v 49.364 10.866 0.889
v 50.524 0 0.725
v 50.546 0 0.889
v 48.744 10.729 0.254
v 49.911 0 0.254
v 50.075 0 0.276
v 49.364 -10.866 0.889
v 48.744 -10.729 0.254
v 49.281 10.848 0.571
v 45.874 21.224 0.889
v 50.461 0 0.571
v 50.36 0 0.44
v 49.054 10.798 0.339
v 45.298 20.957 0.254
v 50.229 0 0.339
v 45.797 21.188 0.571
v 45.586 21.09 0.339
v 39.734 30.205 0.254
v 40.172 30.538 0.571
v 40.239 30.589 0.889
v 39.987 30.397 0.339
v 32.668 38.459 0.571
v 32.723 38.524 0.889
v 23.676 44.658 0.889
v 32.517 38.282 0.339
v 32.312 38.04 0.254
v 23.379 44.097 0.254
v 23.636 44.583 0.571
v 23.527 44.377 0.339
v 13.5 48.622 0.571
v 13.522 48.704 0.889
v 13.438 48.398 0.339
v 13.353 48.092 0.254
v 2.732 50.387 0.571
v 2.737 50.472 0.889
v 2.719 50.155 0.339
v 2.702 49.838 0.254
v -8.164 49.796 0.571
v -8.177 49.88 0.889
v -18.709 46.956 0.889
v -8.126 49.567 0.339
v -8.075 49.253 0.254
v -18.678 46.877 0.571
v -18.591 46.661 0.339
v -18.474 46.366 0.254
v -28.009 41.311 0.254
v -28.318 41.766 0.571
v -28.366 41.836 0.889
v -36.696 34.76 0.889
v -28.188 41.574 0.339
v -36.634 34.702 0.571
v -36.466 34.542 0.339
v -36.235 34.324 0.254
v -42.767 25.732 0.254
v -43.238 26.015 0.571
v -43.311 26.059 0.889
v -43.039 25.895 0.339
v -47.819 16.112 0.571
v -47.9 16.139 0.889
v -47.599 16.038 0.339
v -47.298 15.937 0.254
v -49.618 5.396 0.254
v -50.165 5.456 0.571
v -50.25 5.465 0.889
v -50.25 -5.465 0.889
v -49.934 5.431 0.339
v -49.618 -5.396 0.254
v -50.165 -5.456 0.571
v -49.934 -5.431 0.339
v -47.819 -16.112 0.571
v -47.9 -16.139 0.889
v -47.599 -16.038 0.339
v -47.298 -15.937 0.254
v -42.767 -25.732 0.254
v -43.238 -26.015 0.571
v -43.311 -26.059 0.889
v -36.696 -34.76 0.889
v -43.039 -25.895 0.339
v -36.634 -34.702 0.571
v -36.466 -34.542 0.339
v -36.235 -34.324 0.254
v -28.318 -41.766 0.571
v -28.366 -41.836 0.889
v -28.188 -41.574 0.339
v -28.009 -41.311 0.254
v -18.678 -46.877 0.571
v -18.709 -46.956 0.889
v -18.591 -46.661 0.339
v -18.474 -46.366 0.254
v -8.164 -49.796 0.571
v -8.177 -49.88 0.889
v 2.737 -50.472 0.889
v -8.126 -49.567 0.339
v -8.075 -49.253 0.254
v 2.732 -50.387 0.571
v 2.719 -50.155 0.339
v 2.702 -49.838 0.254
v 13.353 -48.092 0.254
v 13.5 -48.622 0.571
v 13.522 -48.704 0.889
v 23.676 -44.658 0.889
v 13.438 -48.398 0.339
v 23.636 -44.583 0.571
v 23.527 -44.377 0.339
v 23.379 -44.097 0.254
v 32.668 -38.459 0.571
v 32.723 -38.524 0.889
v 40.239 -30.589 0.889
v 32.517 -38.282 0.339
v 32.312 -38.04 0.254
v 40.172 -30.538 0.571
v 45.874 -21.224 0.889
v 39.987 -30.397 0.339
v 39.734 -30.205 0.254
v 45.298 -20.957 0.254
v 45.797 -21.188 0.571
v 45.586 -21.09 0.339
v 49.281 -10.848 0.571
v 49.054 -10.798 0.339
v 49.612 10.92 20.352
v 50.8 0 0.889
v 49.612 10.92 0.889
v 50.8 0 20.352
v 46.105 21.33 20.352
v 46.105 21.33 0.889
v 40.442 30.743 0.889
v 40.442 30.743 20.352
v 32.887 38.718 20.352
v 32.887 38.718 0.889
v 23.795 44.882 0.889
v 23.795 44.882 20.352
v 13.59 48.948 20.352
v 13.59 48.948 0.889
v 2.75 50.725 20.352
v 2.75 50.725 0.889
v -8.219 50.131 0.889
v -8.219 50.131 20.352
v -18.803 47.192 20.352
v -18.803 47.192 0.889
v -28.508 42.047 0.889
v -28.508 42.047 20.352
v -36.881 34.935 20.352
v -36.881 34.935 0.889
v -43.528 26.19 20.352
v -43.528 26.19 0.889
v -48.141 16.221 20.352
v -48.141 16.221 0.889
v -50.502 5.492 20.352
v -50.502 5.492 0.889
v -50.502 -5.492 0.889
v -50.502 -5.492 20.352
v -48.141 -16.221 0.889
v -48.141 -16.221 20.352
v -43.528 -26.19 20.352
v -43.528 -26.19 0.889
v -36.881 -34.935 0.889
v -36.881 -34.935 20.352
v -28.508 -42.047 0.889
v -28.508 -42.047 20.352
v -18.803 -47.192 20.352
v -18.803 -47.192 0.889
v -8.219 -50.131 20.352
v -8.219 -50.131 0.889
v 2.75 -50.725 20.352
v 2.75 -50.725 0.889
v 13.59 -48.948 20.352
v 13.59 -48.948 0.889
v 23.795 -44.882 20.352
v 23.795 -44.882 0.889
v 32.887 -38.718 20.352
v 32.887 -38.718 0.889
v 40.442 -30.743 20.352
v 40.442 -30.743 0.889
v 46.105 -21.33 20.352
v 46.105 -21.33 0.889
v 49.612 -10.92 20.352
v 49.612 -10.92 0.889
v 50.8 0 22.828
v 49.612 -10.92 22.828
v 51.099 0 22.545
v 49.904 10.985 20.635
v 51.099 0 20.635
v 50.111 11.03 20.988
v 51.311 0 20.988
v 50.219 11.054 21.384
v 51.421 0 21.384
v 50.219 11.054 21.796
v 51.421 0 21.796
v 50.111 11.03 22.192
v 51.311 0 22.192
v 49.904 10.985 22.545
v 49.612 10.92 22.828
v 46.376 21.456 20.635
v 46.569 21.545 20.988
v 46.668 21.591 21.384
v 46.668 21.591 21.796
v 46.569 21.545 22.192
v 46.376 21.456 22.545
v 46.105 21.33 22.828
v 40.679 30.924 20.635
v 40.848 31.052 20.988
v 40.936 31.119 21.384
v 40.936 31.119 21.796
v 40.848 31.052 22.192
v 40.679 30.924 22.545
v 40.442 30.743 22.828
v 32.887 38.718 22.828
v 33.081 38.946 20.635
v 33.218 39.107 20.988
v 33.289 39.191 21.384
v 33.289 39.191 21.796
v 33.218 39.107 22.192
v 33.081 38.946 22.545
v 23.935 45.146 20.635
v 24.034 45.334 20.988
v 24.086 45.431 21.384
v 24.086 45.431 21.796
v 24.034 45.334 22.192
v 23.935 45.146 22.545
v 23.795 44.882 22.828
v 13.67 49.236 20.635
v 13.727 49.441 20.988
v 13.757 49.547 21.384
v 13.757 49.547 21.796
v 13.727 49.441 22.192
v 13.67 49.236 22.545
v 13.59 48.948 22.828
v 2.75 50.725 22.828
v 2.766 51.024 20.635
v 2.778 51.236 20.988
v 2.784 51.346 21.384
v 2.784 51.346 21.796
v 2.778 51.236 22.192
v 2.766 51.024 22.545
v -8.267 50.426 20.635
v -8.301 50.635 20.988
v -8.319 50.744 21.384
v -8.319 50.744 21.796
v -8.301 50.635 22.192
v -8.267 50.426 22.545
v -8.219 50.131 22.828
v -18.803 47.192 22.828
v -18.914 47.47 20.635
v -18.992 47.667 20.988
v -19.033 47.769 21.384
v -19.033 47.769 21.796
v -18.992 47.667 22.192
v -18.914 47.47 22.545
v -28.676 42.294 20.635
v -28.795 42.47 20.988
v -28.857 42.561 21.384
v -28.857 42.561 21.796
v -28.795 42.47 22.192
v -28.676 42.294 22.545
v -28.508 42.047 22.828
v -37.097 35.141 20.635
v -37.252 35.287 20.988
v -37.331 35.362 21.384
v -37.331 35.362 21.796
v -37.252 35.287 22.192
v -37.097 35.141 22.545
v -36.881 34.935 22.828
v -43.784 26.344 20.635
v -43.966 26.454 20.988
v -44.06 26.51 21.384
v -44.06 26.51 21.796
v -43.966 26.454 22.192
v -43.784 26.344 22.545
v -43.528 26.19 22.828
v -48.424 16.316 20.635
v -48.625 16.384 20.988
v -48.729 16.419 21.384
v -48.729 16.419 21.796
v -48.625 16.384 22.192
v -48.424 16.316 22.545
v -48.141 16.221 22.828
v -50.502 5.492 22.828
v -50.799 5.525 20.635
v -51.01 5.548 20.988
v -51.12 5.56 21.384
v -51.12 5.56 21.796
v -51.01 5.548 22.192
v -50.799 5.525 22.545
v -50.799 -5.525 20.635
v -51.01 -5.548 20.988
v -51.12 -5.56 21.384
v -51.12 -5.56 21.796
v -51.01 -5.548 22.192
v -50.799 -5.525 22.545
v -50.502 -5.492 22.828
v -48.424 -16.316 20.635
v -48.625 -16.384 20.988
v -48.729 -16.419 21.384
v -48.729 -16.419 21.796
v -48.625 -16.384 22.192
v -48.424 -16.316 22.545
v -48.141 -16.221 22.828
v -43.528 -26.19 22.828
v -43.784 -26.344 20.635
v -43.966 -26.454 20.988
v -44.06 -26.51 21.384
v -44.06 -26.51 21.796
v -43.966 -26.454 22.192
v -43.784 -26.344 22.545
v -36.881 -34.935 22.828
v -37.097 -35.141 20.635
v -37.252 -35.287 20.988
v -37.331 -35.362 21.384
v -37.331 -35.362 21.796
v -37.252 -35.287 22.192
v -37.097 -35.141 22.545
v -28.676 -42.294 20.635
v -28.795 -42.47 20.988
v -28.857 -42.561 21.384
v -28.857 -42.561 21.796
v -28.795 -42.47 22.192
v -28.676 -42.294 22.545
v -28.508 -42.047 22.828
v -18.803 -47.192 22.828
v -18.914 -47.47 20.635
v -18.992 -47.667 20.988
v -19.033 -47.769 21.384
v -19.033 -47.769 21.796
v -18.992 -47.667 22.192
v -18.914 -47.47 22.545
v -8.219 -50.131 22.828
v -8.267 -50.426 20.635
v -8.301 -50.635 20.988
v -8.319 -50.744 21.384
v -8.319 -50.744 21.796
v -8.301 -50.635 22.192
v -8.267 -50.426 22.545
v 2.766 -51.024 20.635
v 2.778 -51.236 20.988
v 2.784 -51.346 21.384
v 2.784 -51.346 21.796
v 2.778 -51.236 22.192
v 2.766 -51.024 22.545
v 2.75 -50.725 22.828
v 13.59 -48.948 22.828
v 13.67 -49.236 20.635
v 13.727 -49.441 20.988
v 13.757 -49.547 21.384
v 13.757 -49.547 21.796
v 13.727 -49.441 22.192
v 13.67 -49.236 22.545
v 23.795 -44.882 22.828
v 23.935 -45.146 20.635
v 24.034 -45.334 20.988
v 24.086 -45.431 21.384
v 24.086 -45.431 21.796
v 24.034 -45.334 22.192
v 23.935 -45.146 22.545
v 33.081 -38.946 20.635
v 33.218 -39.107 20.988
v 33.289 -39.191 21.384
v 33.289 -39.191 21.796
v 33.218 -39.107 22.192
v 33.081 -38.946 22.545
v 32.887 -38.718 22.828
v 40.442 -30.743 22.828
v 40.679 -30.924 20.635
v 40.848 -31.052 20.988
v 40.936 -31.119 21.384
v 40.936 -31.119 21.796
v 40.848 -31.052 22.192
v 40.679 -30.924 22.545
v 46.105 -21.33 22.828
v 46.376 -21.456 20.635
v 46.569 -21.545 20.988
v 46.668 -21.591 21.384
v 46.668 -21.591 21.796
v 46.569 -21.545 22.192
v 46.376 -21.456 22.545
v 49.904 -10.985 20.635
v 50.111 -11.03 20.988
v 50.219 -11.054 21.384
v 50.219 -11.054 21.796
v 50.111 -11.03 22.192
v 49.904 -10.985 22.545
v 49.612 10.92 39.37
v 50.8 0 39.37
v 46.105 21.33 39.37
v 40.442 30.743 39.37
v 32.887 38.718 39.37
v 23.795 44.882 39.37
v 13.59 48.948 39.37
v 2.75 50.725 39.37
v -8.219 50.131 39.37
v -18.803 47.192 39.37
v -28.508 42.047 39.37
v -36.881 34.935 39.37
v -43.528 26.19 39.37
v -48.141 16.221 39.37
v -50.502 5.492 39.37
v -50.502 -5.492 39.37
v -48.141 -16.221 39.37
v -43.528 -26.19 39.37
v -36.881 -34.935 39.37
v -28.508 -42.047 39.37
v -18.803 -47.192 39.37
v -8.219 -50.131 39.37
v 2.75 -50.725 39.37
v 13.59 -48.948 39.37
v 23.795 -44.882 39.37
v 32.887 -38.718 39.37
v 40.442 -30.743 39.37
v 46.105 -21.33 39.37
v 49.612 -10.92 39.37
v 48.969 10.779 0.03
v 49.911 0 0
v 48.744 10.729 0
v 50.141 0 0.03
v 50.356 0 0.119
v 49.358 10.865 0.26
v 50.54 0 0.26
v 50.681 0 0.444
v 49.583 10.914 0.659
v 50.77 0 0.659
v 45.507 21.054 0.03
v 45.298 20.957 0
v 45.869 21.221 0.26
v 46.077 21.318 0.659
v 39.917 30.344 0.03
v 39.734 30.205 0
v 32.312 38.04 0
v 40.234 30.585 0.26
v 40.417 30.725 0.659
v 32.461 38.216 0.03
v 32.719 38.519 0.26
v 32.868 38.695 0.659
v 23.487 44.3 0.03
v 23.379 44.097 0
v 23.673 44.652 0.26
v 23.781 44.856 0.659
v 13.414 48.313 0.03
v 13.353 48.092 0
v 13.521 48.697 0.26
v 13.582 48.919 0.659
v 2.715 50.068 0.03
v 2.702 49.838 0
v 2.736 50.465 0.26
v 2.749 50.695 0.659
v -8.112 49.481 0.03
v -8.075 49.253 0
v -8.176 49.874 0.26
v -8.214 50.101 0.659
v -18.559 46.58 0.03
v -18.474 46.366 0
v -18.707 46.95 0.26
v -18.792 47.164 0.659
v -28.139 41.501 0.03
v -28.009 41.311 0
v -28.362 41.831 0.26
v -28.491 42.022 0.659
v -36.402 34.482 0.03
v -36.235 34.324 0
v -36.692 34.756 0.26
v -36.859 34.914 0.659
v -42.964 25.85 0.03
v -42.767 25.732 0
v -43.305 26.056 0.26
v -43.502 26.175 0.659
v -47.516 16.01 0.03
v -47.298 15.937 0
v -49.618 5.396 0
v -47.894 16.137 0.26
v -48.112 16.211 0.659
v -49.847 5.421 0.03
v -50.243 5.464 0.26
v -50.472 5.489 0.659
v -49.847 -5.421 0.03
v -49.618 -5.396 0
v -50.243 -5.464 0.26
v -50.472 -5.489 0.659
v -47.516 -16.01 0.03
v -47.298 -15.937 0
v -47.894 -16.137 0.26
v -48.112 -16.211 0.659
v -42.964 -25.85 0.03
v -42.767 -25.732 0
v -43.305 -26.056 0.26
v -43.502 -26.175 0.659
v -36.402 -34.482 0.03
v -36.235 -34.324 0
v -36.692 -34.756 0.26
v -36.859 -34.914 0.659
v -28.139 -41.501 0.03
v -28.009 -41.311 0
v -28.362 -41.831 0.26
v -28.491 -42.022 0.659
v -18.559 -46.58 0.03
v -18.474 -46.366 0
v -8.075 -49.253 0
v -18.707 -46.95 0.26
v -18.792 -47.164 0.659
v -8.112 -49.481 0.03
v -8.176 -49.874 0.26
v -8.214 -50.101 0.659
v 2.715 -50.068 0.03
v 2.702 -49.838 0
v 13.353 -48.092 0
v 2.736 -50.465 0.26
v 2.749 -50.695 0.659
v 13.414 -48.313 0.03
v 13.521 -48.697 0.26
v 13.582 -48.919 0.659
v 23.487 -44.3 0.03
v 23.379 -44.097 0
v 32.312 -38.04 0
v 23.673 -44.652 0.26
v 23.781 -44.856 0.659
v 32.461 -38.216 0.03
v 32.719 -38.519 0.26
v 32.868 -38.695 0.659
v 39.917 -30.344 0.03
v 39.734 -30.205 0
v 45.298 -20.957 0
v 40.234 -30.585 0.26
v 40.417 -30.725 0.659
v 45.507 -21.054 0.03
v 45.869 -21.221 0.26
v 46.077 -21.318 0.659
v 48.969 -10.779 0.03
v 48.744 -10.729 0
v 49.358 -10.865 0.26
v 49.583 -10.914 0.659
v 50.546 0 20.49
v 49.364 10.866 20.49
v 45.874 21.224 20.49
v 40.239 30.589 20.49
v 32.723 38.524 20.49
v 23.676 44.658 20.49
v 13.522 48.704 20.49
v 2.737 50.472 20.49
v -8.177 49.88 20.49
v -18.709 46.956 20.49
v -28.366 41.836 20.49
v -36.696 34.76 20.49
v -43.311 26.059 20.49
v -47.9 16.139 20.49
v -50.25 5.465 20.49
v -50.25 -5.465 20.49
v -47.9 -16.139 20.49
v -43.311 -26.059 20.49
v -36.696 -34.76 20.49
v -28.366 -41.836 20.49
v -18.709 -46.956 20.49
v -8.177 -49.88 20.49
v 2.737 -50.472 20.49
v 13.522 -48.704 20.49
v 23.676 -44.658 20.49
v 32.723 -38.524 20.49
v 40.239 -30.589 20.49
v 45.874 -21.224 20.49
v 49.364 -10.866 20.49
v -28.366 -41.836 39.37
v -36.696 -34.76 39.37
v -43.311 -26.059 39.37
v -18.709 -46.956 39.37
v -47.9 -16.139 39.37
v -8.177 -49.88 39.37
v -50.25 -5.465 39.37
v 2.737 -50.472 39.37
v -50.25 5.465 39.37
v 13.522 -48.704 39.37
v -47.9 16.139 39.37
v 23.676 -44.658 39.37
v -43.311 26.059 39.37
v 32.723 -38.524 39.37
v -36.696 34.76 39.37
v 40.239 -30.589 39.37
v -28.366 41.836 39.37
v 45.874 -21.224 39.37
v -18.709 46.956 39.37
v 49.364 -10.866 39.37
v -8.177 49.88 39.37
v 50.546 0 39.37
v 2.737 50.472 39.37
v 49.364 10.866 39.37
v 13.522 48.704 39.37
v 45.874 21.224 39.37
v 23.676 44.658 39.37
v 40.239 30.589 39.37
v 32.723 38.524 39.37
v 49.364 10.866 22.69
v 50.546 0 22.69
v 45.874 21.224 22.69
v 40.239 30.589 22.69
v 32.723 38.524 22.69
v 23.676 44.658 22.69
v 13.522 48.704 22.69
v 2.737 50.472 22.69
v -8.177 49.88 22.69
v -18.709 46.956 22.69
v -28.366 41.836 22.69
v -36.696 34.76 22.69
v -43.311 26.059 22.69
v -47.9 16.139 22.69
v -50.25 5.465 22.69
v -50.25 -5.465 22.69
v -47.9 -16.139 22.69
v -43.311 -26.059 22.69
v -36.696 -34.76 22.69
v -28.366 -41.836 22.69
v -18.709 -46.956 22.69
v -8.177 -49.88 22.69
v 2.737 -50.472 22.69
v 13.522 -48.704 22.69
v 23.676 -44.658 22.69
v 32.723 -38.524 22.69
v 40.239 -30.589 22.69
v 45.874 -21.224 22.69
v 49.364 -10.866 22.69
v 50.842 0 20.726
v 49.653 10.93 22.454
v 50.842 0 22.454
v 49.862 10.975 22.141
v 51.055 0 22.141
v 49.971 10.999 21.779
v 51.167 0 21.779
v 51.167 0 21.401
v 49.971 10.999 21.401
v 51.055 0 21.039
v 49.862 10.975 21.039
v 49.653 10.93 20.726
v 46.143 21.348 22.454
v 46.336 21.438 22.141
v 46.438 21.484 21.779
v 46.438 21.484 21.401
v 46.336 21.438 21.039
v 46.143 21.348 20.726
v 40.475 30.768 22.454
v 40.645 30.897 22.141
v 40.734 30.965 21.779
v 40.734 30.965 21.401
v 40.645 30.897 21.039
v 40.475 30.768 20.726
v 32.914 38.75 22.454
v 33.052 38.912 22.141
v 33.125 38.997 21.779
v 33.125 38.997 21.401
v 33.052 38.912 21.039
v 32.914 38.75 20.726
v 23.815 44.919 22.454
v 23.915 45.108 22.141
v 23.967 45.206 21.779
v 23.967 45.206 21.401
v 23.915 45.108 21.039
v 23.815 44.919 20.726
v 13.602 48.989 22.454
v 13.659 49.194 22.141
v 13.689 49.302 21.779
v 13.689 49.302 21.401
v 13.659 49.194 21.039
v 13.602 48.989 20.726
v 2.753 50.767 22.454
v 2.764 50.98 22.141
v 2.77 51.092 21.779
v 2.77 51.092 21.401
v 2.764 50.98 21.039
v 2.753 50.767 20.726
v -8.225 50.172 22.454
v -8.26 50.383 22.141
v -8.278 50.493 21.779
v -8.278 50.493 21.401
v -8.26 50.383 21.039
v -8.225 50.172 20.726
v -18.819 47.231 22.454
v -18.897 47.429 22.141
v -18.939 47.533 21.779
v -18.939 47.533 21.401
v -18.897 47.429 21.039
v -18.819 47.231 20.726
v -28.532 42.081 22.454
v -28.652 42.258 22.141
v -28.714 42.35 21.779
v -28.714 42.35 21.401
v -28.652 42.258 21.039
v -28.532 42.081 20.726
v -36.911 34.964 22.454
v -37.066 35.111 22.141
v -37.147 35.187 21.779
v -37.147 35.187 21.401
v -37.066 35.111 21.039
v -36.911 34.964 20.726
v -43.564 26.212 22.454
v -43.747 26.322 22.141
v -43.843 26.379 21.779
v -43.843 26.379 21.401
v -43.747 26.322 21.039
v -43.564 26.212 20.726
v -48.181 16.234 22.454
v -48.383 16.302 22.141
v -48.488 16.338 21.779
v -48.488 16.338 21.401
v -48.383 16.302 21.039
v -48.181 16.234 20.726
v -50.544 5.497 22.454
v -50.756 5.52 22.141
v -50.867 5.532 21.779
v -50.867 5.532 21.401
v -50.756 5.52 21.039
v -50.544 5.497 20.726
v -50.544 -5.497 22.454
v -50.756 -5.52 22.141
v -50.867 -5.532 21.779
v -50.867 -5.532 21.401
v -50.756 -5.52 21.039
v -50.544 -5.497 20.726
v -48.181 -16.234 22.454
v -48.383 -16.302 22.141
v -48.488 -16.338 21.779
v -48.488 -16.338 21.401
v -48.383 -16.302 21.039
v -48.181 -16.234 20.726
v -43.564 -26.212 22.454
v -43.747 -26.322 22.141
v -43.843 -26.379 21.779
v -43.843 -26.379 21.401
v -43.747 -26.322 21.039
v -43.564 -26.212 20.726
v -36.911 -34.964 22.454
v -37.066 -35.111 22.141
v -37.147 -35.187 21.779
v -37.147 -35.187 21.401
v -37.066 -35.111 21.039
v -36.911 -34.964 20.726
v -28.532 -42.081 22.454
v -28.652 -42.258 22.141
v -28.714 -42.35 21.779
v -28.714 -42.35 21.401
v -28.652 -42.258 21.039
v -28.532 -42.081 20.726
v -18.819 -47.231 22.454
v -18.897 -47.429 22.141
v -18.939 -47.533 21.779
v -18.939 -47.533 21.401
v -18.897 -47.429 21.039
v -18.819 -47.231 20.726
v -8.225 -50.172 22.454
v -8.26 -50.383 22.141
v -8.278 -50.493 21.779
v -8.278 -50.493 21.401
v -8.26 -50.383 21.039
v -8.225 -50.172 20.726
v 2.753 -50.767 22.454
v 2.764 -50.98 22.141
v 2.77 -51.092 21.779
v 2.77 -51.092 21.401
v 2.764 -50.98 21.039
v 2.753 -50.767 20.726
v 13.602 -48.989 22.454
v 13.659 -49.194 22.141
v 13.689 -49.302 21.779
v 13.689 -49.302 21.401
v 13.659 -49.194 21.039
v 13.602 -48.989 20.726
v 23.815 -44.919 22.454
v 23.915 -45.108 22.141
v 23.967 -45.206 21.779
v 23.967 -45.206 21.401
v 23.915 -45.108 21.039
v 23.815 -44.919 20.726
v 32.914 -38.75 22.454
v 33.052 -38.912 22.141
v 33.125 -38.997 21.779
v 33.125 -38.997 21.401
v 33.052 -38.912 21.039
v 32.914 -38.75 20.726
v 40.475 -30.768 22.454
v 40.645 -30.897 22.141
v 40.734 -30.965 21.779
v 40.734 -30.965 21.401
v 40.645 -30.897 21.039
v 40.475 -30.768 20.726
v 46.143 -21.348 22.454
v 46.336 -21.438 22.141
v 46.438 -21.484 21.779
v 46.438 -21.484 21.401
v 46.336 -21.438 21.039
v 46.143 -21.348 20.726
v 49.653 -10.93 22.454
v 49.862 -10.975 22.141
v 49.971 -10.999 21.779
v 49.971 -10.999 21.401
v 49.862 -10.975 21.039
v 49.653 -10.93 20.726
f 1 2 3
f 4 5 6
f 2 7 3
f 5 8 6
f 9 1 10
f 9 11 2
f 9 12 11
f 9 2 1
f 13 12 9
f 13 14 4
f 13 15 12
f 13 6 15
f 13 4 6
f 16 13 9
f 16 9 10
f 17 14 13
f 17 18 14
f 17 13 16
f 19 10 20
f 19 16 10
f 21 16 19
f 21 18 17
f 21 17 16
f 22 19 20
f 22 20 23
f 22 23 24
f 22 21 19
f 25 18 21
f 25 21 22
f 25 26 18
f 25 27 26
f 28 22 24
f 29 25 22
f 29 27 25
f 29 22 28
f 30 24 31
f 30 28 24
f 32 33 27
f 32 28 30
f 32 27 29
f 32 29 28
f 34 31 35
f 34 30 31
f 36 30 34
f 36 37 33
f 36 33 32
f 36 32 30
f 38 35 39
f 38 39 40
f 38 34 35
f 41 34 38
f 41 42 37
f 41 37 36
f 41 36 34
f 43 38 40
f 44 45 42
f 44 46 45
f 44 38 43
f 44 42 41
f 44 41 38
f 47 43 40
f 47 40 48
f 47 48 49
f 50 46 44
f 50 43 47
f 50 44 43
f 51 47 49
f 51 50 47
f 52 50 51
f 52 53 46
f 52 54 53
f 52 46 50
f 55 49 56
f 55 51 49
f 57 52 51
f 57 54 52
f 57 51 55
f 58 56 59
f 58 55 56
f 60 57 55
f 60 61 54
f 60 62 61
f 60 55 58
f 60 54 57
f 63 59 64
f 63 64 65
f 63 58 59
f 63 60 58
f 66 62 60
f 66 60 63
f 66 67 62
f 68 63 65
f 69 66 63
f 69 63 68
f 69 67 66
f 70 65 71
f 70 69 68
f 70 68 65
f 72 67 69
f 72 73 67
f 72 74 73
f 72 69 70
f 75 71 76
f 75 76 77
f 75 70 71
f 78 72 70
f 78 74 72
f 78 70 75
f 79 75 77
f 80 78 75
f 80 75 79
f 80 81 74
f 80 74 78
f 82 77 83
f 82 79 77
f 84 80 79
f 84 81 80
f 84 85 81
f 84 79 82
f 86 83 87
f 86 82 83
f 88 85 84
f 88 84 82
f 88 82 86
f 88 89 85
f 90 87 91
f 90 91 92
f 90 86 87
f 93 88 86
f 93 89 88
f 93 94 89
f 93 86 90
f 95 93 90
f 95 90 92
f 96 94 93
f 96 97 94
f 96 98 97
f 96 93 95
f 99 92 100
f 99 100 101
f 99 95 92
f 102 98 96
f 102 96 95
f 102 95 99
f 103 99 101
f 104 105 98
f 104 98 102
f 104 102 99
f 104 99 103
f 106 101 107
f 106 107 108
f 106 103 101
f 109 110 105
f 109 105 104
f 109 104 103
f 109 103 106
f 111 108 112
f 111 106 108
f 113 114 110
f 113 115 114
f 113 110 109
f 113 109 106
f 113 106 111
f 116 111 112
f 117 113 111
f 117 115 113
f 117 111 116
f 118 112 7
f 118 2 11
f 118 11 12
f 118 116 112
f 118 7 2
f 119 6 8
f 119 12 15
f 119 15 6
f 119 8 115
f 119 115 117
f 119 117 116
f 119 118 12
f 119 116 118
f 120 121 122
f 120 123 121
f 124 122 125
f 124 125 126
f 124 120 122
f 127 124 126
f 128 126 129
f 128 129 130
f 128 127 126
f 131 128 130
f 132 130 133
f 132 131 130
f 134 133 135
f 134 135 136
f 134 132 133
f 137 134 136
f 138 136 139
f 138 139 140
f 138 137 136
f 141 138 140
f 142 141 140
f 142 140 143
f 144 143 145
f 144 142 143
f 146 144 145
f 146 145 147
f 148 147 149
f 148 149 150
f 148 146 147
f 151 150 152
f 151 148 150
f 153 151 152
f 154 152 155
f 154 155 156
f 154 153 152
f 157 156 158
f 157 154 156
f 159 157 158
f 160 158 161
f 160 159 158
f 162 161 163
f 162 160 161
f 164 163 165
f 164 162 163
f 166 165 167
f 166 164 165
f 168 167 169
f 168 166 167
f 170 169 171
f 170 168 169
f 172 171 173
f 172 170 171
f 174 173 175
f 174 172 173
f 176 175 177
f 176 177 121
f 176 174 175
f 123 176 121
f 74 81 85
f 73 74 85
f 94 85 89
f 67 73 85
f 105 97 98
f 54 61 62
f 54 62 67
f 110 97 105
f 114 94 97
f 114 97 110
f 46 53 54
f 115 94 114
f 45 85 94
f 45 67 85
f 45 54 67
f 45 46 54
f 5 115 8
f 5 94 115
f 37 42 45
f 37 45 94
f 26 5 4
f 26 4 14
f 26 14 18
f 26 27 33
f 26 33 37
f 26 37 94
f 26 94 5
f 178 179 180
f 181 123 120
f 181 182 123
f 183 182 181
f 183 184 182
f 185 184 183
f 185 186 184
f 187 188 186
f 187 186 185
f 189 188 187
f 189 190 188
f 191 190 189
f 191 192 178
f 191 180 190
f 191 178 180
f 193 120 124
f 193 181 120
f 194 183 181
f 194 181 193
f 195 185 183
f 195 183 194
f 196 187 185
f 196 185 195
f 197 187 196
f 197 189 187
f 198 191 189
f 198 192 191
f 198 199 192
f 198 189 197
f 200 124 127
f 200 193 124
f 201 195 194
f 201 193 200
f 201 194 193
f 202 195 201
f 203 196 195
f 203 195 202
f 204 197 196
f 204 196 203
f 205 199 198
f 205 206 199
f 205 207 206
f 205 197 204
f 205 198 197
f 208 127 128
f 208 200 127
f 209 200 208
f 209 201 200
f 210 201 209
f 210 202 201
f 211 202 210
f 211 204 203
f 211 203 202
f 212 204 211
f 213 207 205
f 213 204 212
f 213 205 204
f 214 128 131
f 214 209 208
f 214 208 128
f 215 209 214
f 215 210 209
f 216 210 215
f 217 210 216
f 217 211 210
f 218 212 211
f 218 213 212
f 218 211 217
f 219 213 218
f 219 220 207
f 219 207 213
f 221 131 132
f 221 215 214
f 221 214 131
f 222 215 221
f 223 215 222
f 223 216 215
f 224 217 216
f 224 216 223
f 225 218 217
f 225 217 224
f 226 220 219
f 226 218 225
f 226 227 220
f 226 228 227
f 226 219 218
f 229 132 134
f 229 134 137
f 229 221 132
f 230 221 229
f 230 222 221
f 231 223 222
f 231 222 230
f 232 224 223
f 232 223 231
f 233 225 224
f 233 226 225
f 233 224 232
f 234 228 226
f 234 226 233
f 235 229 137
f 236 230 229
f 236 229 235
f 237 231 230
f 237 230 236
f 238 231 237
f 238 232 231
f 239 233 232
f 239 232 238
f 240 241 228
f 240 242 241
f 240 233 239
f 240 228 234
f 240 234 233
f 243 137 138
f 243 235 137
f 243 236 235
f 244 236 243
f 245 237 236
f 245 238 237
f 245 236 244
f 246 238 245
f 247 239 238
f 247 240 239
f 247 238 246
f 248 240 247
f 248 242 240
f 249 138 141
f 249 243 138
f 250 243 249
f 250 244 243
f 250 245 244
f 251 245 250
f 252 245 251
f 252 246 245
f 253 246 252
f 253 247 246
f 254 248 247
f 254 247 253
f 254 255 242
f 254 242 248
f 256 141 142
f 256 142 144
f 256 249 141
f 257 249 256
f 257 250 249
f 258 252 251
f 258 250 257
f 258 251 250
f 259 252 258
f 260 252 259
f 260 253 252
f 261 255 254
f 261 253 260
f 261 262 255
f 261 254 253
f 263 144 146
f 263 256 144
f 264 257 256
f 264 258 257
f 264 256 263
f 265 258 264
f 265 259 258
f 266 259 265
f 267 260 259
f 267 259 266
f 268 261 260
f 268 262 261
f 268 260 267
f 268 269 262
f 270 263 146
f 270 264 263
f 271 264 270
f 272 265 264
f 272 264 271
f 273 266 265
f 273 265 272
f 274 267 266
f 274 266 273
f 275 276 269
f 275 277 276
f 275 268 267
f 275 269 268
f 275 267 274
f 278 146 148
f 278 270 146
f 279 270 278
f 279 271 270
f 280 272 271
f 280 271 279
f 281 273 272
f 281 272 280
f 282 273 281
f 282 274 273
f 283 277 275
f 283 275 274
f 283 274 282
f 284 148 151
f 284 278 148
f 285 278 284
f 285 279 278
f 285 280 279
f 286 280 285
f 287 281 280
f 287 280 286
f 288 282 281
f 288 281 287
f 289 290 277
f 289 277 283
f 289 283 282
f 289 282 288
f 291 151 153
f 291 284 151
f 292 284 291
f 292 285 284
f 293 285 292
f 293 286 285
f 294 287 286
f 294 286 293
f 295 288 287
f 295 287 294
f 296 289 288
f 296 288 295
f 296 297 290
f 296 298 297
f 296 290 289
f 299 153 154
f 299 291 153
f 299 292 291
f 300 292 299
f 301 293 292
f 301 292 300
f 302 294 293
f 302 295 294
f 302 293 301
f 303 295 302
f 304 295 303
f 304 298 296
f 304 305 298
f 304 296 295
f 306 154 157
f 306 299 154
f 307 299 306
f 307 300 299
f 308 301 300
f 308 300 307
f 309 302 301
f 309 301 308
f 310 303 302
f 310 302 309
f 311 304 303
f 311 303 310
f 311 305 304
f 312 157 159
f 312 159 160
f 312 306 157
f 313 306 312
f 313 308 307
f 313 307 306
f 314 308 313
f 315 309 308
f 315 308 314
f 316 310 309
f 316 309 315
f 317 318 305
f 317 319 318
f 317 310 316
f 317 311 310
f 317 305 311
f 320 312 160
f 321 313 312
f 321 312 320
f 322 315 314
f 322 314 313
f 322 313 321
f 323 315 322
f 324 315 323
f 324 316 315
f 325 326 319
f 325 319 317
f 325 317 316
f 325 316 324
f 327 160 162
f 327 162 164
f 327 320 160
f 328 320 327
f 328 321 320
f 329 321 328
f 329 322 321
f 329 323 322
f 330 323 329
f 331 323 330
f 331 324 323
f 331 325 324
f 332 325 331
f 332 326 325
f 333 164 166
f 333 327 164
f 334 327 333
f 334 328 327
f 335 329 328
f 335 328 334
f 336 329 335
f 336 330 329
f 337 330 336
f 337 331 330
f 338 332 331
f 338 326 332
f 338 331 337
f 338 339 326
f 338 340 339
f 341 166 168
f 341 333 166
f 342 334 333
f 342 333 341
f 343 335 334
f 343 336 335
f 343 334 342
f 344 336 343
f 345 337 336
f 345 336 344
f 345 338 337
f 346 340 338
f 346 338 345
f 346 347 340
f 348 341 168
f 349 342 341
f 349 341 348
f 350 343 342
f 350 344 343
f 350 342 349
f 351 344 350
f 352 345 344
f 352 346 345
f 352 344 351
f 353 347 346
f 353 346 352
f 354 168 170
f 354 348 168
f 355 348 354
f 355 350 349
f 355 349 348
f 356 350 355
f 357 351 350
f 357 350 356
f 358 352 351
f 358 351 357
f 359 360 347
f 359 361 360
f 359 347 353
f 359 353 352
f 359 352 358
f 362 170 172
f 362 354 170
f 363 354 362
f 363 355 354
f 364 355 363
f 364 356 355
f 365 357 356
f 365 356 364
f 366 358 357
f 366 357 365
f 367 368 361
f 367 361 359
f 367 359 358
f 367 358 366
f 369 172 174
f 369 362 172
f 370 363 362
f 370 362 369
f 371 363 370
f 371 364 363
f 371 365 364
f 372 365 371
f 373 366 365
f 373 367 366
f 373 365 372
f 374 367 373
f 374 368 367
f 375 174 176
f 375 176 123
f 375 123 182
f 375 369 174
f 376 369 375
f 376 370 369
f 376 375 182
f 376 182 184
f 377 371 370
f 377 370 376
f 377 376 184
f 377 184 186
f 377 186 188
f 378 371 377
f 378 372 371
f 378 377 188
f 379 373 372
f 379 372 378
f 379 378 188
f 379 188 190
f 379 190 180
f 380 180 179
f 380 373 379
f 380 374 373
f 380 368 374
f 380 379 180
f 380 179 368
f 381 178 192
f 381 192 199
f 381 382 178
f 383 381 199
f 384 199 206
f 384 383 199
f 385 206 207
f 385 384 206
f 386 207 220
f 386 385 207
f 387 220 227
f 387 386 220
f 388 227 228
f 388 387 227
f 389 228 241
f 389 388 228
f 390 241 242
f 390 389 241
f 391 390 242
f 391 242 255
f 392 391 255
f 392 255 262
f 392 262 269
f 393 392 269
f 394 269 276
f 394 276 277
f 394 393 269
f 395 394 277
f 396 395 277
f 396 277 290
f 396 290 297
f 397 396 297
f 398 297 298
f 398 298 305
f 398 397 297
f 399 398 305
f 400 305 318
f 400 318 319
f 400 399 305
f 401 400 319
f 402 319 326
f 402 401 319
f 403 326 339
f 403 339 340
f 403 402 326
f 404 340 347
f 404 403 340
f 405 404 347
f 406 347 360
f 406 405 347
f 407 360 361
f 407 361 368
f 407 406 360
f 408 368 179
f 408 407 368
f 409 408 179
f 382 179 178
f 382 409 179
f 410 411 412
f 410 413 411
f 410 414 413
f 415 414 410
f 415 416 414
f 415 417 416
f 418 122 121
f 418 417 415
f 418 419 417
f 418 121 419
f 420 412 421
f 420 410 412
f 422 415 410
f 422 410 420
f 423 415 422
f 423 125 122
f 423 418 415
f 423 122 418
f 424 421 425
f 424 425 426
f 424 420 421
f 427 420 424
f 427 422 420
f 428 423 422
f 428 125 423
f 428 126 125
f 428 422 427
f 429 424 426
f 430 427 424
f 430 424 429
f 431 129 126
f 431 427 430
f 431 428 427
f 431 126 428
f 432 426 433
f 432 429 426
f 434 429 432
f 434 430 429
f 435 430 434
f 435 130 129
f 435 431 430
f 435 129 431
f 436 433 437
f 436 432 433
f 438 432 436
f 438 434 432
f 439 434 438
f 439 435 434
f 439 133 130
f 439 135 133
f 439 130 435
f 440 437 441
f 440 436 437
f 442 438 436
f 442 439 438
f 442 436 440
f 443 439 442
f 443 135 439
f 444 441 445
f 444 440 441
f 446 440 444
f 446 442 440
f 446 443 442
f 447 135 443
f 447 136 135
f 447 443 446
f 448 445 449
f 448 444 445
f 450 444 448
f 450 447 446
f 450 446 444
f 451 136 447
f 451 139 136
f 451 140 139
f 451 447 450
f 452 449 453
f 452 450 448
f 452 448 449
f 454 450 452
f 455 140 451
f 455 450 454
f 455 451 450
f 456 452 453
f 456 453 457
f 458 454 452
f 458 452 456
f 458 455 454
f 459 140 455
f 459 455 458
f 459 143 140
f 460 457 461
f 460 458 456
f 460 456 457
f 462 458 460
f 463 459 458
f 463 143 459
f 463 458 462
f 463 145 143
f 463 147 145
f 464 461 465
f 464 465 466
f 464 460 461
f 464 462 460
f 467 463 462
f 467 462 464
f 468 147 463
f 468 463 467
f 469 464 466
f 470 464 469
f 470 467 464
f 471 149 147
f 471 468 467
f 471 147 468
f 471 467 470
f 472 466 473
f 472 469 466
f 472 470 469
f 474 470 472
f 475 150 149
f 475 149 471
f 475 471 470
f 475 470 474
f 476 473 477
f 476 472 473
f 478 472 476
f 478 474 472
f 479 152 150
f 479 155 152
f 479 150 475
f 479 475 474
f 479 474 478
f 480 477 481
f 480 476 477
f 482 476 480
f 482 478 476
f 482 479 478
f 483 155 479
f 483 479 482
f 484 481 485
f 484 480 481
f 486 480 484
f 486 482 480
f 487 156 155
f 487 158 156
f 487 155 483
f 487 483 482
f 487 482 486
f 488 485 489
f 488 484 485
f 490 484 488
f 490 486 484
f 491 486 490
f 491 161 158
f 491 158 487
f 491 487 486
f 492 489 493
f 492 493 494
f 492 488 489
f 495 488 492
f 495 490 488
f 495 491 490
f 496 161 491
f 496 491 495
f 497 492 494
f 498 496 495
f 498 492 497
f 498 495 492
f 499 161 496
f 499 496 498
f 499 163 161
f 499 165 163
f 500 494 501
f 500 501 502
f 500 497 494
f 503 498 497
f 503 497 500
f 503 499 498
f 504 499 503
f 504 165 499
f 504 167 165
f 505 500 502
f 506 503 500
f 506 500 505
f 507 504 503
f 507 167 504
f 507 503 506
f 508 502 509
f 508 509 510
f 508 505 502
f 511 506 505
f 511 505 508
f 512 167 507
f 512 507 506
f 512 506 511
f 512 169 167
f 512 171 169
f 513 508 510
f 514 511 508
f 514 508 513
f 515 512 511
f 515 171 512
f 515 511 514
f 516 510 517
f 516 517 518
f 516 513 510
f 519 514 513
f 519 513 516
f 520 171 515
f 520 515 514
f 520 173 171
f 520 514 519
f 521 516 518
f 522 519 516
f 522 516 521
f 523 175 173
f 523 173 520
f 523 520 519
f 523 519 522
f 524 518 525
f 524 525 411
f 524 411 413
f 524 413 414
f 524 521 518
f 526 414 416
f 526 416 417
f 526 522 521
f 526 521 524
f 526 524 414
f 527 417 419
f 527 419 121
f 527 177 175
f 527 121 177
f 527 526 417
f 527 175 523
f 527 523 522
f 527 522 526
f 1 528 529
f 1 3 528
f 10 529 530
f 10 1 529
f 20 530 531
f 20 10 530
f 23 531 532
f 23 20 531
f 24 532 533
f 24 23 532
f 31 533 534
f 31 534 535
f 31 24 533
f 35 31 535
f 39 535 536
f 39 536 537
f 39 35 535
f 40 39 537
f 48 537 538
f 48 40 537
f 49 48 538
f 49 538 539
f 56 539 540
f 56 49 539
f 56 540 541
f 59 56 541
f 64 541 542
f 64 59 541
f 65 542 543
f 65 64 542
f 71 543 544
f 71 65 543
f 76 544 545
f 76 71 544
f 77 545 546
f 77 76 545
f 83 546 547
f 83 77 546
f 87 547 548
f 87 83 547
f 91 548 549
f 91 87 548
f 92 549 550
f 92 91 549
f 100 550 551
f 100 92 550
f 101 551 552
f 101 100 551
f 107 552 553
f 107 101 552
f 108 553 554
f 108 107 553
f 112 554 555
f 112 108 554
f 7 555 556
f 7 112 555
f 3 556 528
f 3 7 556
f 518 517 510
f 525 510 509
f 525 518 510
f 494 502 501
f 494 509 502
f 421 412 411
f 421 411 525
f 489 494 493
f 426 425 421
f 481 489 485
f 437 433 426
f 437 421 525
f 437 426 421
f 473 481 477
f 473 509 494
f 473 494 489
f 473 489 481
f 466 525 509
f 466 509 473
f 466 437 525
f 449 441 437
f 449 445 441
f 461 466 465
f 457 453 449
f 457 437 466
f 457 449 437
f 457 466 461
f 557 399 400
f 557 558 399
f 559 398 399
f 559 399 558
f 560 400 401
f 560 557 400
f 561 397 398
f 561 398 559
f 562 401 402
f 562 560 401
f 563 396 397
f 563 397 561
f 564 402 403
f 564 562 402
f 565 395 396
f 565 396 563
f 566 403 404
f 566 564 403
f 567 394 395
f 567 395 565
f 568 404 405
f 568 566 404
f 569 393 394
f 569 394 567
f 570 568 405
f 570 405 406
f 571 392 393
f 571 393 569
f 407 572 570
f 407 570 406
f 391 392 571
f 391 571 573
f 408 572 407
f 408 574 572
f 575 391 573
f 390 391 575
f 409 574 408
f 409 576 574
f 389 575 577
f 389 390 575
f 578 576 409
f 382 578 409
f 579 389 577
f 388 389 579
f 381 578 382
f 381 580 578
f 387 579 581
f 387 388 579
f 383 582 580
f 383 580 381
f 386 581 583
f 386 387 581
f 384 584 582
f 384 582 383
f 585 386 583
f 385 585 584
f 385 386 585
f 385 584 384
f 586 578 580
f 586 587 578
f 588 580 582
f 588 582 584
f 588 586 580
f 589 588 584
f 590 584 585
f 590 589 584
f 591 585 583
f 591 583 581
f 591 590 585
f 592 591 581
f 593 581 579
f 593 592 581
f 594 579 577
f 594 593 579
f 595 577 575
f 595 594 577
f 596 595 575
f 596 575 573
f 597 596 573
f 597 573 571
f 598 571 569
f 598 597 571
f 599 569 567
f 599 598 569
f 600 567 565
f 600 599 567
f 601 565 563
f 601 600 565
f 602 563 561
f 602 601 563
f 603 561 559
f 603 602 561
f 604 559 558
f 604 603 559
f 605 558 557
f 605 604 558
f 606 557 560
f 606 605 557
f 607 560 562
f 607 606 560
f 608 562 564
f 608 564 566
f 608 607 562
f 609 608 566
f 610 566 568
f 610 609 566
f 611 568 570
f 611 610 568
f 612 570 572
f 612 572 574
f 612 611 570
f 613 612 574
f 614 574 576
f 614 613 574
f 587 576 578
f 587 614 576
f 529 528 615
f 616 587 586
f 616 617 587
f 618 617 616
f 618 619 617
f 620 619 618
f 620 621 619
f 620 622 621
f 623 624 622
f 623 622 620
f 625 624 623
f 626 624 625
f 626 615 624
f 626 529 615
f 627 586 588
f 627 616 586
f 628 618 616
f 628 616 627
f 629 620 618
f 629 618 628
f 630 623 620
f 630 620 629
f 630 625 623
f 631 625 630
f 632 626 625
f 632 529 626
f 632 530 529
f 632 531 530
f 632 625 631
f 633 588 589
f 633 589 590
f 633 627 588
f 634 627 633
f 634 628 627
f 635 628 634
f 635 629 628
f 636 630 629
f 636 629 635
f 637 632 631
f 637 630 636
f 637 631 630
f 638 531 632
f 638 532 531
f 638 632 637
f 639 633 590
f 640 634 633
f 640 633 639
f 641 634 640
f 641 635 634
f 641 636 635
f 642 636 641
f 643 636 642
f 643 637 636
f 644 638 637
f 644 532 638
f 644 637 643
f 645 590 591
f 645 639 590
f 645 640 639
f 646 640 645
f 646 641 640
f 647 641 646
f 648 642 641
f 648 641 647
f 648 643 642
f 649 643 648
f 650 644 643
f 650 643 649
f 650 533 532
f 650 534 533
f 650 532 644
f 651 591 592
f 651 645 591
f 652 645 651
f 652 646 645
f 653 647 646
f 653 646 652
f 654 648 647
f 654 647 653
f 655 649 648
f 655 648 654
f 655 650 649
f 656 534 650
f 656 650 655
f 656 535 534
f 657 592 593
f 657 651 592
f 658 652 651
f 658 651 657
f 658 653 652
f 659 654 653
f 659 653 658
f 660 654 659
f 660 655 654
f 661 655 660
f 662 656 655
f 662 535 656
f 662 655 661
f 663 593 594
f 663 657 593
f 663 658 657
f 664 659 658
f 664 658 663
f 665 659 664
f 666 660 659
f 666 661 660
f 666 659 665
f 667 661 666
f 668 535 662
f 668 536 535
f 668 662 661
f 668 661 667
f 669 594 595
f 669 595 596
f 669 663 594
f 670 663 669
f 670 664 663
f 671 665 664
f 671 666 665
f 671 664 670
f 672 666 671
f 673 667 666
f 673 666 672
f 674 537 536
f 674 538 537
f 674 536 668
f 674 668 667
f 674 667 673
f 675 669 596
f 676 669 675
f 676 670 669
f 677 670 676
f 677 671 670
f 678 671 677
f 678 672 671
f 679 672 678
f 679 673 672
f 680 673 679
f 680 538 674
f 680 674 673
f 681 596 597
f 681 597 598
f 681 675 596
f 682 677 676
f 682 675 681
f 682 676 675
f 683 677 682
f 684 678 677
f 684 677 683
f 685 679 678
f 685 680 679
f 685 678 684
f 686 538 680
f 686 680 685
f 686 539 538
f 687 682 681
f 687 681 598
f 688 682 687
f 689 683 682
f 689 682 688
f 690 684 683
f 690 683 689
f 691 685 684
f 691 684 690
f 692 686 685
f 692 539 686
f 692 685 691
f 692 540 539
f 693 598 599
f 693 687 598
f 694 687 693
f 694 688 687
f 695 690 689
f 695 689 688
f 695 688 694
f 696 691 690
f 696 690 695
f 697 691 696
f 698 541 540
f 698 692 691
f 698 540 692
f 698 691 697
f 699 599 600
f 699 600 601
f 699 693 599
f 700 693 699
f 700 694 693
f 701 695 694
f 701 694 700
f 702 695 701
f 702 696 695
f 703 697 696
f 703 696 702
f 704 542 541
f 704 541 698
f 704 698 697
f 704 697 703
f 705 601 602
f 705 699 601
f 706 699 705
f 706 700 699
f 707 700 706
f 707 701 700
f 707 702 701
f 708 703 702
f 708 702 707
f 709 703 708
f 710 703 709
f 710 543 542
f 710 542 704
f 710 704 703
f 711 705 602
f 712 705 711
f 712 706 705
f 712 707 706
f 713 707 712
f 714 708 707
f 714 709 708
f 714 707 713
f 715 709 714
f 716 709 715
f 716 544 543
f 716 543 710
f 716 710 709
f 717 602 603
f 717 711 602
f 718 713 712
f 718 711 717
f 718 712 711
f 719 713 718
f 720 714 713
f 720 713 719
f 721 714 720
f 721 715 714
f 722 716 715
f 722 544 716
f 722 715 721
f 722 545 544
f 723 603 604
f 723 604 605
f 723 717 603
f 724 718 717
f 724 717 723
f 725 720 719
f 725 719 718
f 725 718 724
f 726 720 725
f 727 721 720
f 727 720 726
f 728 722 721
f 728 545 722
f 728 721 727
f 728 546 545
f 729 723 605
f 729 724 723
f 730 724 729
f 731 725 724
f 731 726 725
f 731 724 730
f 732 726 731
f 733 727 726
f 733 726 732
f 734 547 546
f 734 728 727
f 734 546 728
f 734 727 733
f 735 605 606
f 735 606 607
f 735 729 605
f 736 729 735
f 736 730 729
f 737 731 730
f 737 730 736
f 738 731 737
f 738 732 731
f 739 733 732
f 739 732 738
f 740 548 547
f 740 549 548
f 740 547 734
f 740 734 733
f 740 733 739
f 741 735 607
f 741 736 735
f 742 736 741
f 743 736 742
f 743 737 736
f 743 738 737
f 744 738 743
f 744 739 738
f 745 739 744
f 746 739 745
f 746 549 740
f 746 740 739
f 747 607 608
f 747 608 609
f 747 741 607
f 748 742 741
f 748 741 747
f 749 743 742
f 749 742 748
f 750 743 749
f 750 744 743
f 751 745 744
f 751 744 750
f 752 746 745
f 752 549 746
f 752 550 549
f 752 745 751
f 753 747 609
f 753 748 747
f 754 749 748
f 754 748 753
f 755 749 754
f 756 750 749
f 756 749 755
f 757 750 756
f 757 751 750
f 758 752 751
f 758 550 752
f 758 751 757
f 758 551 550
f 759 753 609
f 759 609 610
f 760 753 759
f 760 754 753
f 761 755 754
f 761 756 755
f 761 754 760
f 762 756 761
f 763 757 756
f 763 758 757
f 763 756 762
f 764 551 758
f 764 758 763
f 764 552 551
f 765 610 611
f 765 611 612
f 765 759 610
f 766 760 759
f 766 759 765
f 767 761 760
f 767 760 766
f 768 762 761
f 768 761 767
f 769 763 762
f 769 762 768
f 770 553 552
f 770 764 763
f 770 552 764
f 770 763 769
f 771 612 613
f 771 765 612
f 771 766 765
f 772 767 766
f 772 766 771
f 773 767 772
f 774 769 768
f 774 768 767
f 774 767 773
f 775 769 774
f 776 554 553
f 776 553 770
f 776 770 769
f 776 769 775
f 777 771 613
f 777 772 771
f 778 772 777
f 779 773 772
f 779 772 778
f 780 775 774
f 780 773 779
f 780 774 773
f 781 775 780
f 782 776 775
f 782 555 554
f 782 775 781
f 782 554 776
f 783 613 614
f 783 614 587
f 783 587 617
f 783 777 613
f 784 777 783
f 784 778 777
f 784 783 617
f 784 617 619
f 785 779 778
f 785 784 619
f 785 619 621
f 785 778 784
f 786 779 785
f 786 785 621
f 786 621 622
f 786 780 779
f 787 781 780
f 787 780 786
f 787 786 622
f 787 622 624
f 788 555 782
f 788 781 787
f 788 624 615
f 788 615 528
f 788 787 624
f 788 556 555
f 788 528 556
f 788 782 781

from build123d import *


with BuildPart() as f1:
    # F0 (on Front) → F1 (revolve)
    with BuildSketch(Plane.XZ):
        with BuildLine():
            Line((0, 0.254), (0, 0))
            Line((0, 0), (49.911, 0))
            ThreePointArc((49.911, 0), (50.539618, 0.260382), (50.8, 0.889))
            Line((50.8, 0.889), (50.8, 20.352157))
            ThreePointArc((50.8, 20.352157), (51.435, 21.59), (50.8, 22.827843))
            Line((50.8, 22.827843), (50.8, 39.37))
            Line((50.8, 39.37), (50.546, 39.37))
            Line((50.546, 39.37), (50.546, 22.689852))
            ThreePointArc((50.546, 22.689852), (51.181, 21.59), (50.546, 20.490148))
            Line((50.546, 20.490148), (50.546, 0.889))
            ThreePointArc((50.546, 0.889), (50.360013, 0.439987), (49.911, 0.254))
            Line((49.911, 0.254), (0, 0.254))
        make_face()
    revolve(axis=Axis((0, 0, 21.369892), (0, 0, 1)))


solid = f1.part
